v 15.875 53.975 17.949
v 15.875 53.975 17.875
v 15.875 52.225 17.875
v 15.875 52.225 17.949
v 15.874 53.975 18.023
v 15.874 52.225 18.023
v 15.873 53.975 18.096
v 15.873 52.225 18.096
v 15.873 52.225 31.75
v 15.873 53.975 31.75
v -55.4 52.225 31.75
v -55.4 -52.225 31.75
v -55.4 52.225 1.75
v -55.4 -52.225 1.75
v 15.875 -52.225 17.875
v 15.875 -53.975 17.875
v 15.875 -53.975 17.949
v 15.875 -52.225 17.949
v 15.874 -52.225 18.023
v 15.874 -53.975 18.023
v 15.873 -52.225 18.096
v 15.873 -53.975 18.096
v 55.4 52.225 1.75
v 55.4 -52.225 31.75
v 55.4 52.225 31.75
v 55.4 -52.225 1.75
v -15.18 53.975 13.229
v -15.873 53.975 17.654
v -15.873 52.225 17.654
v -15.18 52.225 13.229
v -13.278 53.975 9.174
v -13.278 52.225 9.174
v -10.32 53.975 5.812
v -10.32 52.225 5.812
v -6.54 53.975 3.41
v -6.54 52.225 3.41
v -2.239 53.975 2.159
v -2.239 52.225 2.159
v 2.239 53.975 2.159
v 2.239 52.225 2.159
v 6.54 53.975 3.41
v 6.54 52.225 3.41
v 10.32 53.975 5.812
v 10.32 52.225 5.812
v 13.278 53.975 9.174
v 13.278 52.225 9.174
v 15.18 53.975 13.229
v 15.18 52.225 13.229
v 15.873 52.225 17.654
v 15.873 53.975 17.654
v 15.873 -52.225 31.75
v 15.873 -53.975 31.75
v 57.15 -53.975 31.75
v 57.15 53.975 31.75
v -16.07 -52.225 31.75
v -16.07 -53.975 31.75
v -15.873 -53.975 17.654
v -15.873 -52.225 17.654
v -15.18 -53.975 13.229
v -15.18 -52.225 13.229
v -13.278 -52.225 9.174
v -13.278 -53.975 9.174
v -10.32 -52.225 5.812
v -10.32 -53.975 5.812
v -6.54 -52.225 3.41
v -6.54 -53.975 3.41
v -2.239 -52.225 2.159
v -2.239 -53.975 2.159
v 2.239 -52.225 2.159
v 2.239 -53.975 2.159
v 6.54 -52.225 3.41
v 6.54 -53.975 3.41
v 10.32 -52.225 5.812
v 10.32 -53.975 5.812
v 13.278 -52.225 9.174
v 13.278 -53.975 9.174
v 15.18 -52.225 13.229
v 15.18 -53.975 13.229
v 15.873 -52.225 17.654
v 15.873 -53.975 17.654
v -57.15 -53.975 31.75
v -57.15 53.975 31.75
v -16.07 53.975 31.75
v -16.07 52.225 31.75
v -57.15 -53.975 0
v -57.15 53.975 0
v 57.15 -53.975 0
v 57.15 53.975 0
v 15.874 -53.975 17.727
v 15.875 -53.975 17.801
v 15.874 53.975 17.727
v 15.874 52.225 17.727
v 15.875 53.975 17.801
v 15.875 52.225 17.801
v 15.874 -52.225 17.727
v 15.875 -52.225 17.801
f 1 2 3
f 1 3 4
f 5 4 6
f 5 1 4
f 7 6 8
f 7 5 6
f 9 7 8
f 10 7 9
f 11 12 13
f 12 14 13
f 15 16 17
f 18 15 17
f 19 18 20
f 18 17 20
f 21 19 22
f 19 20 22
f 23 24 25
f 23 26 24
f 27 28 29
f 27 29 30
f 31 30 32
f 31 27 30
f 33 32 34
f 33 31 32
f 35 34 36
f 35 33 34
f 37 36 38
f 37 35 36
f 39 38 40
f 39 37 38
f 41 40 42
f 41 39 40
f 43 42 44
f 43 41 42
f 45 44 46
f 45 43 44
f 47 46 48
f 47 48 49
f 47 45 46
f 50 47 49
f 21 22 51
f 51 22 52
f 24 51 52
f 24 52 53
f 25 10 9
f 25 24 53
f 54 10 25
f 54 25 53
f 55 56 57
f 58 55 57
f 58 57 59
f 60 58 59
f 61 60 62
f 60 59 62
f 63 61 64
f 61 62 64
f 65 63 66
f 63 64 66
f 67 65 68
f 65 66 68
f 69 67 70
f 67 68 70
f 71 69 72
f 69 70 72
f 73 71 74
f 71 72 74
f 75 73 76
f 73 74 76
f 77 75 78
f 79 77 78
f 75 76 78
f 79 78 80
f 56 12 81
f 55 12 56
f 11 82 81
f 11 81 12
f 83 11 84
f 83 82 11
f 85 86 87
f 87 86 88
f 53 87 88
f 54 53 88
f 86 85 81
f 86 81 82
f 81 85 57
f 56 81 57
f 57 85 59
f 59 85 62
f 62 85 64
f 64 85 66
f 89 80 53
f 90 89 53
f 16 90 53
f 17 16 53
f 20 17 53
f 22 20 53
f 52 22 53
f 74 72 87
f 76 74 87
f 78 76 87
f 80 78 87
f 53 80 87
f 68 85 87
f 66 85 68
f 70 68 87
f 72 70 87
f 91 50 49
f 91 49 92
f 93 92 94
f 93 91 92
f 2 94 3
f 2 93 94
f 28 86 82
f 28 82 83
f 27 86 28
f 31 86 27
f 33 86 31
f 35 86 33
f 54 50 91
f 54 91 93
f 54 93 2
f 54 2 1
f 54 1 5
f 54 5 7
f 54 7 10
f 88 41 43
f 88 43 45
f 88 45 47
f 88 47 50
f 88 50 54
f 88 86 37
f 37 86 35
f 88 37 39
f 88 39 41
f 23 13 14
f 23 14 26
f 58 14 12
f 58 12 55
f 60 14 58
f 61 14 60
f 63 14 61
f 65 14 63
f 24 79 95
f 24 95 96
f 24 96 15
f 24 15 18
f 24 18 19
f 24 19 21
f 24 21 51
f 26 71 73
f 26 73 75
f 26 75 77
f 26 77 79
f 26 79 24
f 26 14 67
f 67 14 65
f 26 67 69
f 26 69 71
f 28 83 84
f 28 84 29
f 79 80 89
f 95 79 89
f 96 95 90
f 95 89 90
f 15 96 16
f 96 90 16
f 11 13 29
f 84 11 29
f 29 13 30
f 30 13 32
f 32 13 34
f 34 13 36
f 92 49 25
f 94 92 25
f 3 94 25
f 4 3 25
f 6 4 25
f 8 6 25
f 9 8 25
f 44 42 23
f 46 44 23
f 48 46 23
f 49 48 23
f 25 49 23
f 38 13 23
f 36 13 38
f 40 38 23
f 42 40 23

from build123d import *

# Parameters (mm, degrees)
F0_W     = 114.3
F0_H     = 107.95
F1_DEPTH = 31.75
F3_T     = -1.75
F4_DEPTH = 1.75


# Not quite as in the source:
# - a pattern or mirror of a feature is missing from the dataset's text; its kind, count and spacing are read off the source's solid


with BuildPart() as f1:
    # F0 (on Top) → F1 (new body)
    with BuildSketch(Plane.XY):
        Rectangle(F0_W, F0_H)
    extrude(amount=F1_DEPTH)

    # F3
    f3_openings = [f1.faces().sort_by_distance(p)[0] for p in [
        (0, 0, 31.75),
    ]]
    offset(amount=F3_T, openings=f3_openings)

    # F2 (on face) → F4 (cut)
    with BuildSketch(Plane.XZ.offset(53.975)):
        with BuildLine():
            ThreePointArc((-7.7136243103, 31.75), (-13.7391570489, 25.8280615857), (-15.873456613, 17.6536402154))
            ThreePointArc((-15.873456613, 17.6536402154), (0, 2), (15.873456613, 17.6536402154))
            Line((15.873456613, 17.6536402154), (15.873456613, 18.0963597846))
            ThreePointArc((15.873456613, 18.0963597846), (13.6269244294, 26.0188661333), (7.7136243103, 31.75))
            Line((7.7136243103, 31.75), (-7.7136243103, 31.75))
        make_face()
        with BuildLine():
            Line((-16.0700342862, 31.75), (-15.873456613, 17.6536402154))
            ThreePointArc((-15.873456613, 17.6536402154), (-13.7391570489, 25.8280615857), (-7.7136243103, 31.75))
            Line((-7.7136243103, 31.75), (-16.0700342862, 31.75))
        make_face()
        with BuildLine():
            Line((15.873456613, 18.0963597846), (15.873456613, 17.6536402154))
            ThreePointArc((15.873456613, 17.6536402154), (15.8746141486, 17.7643174175), (15.875, 17.875))
            ThreePointArc((15.875, 17.875), (15.8746141486, 17.9856825825), (15.873456613, 18.0963597846))
        make_face()
        with BuildLine():
            ThreePointArc((7.7136243103, 31.75), (0, 33.75), (-7.7136243103, 31.75))
            Line((-7.7136243103, 31.75), (7.7136243103, 31.75))
        make_face()
        with BuildLine():
            ThreePointArc((7.7136243103, 31.75), (13.6269244294, 26.0188661333), (15.873456613, 18.0963597846))
            Line((15.873456613, 18.0963597846), (15.873456613, 31.75))
            Line((15.873456613, 31.75), (7.7136243103, 31.75))
        make_face()
    f4 = extrude(amount=-F4_DEPTH, mode=Mode.SUBTRACT)

    # F4_copies: F4 across plane
    add(f4.mirror(Plane.ZX), mode=Mode.SUBTRACT)


solid = f1.part
